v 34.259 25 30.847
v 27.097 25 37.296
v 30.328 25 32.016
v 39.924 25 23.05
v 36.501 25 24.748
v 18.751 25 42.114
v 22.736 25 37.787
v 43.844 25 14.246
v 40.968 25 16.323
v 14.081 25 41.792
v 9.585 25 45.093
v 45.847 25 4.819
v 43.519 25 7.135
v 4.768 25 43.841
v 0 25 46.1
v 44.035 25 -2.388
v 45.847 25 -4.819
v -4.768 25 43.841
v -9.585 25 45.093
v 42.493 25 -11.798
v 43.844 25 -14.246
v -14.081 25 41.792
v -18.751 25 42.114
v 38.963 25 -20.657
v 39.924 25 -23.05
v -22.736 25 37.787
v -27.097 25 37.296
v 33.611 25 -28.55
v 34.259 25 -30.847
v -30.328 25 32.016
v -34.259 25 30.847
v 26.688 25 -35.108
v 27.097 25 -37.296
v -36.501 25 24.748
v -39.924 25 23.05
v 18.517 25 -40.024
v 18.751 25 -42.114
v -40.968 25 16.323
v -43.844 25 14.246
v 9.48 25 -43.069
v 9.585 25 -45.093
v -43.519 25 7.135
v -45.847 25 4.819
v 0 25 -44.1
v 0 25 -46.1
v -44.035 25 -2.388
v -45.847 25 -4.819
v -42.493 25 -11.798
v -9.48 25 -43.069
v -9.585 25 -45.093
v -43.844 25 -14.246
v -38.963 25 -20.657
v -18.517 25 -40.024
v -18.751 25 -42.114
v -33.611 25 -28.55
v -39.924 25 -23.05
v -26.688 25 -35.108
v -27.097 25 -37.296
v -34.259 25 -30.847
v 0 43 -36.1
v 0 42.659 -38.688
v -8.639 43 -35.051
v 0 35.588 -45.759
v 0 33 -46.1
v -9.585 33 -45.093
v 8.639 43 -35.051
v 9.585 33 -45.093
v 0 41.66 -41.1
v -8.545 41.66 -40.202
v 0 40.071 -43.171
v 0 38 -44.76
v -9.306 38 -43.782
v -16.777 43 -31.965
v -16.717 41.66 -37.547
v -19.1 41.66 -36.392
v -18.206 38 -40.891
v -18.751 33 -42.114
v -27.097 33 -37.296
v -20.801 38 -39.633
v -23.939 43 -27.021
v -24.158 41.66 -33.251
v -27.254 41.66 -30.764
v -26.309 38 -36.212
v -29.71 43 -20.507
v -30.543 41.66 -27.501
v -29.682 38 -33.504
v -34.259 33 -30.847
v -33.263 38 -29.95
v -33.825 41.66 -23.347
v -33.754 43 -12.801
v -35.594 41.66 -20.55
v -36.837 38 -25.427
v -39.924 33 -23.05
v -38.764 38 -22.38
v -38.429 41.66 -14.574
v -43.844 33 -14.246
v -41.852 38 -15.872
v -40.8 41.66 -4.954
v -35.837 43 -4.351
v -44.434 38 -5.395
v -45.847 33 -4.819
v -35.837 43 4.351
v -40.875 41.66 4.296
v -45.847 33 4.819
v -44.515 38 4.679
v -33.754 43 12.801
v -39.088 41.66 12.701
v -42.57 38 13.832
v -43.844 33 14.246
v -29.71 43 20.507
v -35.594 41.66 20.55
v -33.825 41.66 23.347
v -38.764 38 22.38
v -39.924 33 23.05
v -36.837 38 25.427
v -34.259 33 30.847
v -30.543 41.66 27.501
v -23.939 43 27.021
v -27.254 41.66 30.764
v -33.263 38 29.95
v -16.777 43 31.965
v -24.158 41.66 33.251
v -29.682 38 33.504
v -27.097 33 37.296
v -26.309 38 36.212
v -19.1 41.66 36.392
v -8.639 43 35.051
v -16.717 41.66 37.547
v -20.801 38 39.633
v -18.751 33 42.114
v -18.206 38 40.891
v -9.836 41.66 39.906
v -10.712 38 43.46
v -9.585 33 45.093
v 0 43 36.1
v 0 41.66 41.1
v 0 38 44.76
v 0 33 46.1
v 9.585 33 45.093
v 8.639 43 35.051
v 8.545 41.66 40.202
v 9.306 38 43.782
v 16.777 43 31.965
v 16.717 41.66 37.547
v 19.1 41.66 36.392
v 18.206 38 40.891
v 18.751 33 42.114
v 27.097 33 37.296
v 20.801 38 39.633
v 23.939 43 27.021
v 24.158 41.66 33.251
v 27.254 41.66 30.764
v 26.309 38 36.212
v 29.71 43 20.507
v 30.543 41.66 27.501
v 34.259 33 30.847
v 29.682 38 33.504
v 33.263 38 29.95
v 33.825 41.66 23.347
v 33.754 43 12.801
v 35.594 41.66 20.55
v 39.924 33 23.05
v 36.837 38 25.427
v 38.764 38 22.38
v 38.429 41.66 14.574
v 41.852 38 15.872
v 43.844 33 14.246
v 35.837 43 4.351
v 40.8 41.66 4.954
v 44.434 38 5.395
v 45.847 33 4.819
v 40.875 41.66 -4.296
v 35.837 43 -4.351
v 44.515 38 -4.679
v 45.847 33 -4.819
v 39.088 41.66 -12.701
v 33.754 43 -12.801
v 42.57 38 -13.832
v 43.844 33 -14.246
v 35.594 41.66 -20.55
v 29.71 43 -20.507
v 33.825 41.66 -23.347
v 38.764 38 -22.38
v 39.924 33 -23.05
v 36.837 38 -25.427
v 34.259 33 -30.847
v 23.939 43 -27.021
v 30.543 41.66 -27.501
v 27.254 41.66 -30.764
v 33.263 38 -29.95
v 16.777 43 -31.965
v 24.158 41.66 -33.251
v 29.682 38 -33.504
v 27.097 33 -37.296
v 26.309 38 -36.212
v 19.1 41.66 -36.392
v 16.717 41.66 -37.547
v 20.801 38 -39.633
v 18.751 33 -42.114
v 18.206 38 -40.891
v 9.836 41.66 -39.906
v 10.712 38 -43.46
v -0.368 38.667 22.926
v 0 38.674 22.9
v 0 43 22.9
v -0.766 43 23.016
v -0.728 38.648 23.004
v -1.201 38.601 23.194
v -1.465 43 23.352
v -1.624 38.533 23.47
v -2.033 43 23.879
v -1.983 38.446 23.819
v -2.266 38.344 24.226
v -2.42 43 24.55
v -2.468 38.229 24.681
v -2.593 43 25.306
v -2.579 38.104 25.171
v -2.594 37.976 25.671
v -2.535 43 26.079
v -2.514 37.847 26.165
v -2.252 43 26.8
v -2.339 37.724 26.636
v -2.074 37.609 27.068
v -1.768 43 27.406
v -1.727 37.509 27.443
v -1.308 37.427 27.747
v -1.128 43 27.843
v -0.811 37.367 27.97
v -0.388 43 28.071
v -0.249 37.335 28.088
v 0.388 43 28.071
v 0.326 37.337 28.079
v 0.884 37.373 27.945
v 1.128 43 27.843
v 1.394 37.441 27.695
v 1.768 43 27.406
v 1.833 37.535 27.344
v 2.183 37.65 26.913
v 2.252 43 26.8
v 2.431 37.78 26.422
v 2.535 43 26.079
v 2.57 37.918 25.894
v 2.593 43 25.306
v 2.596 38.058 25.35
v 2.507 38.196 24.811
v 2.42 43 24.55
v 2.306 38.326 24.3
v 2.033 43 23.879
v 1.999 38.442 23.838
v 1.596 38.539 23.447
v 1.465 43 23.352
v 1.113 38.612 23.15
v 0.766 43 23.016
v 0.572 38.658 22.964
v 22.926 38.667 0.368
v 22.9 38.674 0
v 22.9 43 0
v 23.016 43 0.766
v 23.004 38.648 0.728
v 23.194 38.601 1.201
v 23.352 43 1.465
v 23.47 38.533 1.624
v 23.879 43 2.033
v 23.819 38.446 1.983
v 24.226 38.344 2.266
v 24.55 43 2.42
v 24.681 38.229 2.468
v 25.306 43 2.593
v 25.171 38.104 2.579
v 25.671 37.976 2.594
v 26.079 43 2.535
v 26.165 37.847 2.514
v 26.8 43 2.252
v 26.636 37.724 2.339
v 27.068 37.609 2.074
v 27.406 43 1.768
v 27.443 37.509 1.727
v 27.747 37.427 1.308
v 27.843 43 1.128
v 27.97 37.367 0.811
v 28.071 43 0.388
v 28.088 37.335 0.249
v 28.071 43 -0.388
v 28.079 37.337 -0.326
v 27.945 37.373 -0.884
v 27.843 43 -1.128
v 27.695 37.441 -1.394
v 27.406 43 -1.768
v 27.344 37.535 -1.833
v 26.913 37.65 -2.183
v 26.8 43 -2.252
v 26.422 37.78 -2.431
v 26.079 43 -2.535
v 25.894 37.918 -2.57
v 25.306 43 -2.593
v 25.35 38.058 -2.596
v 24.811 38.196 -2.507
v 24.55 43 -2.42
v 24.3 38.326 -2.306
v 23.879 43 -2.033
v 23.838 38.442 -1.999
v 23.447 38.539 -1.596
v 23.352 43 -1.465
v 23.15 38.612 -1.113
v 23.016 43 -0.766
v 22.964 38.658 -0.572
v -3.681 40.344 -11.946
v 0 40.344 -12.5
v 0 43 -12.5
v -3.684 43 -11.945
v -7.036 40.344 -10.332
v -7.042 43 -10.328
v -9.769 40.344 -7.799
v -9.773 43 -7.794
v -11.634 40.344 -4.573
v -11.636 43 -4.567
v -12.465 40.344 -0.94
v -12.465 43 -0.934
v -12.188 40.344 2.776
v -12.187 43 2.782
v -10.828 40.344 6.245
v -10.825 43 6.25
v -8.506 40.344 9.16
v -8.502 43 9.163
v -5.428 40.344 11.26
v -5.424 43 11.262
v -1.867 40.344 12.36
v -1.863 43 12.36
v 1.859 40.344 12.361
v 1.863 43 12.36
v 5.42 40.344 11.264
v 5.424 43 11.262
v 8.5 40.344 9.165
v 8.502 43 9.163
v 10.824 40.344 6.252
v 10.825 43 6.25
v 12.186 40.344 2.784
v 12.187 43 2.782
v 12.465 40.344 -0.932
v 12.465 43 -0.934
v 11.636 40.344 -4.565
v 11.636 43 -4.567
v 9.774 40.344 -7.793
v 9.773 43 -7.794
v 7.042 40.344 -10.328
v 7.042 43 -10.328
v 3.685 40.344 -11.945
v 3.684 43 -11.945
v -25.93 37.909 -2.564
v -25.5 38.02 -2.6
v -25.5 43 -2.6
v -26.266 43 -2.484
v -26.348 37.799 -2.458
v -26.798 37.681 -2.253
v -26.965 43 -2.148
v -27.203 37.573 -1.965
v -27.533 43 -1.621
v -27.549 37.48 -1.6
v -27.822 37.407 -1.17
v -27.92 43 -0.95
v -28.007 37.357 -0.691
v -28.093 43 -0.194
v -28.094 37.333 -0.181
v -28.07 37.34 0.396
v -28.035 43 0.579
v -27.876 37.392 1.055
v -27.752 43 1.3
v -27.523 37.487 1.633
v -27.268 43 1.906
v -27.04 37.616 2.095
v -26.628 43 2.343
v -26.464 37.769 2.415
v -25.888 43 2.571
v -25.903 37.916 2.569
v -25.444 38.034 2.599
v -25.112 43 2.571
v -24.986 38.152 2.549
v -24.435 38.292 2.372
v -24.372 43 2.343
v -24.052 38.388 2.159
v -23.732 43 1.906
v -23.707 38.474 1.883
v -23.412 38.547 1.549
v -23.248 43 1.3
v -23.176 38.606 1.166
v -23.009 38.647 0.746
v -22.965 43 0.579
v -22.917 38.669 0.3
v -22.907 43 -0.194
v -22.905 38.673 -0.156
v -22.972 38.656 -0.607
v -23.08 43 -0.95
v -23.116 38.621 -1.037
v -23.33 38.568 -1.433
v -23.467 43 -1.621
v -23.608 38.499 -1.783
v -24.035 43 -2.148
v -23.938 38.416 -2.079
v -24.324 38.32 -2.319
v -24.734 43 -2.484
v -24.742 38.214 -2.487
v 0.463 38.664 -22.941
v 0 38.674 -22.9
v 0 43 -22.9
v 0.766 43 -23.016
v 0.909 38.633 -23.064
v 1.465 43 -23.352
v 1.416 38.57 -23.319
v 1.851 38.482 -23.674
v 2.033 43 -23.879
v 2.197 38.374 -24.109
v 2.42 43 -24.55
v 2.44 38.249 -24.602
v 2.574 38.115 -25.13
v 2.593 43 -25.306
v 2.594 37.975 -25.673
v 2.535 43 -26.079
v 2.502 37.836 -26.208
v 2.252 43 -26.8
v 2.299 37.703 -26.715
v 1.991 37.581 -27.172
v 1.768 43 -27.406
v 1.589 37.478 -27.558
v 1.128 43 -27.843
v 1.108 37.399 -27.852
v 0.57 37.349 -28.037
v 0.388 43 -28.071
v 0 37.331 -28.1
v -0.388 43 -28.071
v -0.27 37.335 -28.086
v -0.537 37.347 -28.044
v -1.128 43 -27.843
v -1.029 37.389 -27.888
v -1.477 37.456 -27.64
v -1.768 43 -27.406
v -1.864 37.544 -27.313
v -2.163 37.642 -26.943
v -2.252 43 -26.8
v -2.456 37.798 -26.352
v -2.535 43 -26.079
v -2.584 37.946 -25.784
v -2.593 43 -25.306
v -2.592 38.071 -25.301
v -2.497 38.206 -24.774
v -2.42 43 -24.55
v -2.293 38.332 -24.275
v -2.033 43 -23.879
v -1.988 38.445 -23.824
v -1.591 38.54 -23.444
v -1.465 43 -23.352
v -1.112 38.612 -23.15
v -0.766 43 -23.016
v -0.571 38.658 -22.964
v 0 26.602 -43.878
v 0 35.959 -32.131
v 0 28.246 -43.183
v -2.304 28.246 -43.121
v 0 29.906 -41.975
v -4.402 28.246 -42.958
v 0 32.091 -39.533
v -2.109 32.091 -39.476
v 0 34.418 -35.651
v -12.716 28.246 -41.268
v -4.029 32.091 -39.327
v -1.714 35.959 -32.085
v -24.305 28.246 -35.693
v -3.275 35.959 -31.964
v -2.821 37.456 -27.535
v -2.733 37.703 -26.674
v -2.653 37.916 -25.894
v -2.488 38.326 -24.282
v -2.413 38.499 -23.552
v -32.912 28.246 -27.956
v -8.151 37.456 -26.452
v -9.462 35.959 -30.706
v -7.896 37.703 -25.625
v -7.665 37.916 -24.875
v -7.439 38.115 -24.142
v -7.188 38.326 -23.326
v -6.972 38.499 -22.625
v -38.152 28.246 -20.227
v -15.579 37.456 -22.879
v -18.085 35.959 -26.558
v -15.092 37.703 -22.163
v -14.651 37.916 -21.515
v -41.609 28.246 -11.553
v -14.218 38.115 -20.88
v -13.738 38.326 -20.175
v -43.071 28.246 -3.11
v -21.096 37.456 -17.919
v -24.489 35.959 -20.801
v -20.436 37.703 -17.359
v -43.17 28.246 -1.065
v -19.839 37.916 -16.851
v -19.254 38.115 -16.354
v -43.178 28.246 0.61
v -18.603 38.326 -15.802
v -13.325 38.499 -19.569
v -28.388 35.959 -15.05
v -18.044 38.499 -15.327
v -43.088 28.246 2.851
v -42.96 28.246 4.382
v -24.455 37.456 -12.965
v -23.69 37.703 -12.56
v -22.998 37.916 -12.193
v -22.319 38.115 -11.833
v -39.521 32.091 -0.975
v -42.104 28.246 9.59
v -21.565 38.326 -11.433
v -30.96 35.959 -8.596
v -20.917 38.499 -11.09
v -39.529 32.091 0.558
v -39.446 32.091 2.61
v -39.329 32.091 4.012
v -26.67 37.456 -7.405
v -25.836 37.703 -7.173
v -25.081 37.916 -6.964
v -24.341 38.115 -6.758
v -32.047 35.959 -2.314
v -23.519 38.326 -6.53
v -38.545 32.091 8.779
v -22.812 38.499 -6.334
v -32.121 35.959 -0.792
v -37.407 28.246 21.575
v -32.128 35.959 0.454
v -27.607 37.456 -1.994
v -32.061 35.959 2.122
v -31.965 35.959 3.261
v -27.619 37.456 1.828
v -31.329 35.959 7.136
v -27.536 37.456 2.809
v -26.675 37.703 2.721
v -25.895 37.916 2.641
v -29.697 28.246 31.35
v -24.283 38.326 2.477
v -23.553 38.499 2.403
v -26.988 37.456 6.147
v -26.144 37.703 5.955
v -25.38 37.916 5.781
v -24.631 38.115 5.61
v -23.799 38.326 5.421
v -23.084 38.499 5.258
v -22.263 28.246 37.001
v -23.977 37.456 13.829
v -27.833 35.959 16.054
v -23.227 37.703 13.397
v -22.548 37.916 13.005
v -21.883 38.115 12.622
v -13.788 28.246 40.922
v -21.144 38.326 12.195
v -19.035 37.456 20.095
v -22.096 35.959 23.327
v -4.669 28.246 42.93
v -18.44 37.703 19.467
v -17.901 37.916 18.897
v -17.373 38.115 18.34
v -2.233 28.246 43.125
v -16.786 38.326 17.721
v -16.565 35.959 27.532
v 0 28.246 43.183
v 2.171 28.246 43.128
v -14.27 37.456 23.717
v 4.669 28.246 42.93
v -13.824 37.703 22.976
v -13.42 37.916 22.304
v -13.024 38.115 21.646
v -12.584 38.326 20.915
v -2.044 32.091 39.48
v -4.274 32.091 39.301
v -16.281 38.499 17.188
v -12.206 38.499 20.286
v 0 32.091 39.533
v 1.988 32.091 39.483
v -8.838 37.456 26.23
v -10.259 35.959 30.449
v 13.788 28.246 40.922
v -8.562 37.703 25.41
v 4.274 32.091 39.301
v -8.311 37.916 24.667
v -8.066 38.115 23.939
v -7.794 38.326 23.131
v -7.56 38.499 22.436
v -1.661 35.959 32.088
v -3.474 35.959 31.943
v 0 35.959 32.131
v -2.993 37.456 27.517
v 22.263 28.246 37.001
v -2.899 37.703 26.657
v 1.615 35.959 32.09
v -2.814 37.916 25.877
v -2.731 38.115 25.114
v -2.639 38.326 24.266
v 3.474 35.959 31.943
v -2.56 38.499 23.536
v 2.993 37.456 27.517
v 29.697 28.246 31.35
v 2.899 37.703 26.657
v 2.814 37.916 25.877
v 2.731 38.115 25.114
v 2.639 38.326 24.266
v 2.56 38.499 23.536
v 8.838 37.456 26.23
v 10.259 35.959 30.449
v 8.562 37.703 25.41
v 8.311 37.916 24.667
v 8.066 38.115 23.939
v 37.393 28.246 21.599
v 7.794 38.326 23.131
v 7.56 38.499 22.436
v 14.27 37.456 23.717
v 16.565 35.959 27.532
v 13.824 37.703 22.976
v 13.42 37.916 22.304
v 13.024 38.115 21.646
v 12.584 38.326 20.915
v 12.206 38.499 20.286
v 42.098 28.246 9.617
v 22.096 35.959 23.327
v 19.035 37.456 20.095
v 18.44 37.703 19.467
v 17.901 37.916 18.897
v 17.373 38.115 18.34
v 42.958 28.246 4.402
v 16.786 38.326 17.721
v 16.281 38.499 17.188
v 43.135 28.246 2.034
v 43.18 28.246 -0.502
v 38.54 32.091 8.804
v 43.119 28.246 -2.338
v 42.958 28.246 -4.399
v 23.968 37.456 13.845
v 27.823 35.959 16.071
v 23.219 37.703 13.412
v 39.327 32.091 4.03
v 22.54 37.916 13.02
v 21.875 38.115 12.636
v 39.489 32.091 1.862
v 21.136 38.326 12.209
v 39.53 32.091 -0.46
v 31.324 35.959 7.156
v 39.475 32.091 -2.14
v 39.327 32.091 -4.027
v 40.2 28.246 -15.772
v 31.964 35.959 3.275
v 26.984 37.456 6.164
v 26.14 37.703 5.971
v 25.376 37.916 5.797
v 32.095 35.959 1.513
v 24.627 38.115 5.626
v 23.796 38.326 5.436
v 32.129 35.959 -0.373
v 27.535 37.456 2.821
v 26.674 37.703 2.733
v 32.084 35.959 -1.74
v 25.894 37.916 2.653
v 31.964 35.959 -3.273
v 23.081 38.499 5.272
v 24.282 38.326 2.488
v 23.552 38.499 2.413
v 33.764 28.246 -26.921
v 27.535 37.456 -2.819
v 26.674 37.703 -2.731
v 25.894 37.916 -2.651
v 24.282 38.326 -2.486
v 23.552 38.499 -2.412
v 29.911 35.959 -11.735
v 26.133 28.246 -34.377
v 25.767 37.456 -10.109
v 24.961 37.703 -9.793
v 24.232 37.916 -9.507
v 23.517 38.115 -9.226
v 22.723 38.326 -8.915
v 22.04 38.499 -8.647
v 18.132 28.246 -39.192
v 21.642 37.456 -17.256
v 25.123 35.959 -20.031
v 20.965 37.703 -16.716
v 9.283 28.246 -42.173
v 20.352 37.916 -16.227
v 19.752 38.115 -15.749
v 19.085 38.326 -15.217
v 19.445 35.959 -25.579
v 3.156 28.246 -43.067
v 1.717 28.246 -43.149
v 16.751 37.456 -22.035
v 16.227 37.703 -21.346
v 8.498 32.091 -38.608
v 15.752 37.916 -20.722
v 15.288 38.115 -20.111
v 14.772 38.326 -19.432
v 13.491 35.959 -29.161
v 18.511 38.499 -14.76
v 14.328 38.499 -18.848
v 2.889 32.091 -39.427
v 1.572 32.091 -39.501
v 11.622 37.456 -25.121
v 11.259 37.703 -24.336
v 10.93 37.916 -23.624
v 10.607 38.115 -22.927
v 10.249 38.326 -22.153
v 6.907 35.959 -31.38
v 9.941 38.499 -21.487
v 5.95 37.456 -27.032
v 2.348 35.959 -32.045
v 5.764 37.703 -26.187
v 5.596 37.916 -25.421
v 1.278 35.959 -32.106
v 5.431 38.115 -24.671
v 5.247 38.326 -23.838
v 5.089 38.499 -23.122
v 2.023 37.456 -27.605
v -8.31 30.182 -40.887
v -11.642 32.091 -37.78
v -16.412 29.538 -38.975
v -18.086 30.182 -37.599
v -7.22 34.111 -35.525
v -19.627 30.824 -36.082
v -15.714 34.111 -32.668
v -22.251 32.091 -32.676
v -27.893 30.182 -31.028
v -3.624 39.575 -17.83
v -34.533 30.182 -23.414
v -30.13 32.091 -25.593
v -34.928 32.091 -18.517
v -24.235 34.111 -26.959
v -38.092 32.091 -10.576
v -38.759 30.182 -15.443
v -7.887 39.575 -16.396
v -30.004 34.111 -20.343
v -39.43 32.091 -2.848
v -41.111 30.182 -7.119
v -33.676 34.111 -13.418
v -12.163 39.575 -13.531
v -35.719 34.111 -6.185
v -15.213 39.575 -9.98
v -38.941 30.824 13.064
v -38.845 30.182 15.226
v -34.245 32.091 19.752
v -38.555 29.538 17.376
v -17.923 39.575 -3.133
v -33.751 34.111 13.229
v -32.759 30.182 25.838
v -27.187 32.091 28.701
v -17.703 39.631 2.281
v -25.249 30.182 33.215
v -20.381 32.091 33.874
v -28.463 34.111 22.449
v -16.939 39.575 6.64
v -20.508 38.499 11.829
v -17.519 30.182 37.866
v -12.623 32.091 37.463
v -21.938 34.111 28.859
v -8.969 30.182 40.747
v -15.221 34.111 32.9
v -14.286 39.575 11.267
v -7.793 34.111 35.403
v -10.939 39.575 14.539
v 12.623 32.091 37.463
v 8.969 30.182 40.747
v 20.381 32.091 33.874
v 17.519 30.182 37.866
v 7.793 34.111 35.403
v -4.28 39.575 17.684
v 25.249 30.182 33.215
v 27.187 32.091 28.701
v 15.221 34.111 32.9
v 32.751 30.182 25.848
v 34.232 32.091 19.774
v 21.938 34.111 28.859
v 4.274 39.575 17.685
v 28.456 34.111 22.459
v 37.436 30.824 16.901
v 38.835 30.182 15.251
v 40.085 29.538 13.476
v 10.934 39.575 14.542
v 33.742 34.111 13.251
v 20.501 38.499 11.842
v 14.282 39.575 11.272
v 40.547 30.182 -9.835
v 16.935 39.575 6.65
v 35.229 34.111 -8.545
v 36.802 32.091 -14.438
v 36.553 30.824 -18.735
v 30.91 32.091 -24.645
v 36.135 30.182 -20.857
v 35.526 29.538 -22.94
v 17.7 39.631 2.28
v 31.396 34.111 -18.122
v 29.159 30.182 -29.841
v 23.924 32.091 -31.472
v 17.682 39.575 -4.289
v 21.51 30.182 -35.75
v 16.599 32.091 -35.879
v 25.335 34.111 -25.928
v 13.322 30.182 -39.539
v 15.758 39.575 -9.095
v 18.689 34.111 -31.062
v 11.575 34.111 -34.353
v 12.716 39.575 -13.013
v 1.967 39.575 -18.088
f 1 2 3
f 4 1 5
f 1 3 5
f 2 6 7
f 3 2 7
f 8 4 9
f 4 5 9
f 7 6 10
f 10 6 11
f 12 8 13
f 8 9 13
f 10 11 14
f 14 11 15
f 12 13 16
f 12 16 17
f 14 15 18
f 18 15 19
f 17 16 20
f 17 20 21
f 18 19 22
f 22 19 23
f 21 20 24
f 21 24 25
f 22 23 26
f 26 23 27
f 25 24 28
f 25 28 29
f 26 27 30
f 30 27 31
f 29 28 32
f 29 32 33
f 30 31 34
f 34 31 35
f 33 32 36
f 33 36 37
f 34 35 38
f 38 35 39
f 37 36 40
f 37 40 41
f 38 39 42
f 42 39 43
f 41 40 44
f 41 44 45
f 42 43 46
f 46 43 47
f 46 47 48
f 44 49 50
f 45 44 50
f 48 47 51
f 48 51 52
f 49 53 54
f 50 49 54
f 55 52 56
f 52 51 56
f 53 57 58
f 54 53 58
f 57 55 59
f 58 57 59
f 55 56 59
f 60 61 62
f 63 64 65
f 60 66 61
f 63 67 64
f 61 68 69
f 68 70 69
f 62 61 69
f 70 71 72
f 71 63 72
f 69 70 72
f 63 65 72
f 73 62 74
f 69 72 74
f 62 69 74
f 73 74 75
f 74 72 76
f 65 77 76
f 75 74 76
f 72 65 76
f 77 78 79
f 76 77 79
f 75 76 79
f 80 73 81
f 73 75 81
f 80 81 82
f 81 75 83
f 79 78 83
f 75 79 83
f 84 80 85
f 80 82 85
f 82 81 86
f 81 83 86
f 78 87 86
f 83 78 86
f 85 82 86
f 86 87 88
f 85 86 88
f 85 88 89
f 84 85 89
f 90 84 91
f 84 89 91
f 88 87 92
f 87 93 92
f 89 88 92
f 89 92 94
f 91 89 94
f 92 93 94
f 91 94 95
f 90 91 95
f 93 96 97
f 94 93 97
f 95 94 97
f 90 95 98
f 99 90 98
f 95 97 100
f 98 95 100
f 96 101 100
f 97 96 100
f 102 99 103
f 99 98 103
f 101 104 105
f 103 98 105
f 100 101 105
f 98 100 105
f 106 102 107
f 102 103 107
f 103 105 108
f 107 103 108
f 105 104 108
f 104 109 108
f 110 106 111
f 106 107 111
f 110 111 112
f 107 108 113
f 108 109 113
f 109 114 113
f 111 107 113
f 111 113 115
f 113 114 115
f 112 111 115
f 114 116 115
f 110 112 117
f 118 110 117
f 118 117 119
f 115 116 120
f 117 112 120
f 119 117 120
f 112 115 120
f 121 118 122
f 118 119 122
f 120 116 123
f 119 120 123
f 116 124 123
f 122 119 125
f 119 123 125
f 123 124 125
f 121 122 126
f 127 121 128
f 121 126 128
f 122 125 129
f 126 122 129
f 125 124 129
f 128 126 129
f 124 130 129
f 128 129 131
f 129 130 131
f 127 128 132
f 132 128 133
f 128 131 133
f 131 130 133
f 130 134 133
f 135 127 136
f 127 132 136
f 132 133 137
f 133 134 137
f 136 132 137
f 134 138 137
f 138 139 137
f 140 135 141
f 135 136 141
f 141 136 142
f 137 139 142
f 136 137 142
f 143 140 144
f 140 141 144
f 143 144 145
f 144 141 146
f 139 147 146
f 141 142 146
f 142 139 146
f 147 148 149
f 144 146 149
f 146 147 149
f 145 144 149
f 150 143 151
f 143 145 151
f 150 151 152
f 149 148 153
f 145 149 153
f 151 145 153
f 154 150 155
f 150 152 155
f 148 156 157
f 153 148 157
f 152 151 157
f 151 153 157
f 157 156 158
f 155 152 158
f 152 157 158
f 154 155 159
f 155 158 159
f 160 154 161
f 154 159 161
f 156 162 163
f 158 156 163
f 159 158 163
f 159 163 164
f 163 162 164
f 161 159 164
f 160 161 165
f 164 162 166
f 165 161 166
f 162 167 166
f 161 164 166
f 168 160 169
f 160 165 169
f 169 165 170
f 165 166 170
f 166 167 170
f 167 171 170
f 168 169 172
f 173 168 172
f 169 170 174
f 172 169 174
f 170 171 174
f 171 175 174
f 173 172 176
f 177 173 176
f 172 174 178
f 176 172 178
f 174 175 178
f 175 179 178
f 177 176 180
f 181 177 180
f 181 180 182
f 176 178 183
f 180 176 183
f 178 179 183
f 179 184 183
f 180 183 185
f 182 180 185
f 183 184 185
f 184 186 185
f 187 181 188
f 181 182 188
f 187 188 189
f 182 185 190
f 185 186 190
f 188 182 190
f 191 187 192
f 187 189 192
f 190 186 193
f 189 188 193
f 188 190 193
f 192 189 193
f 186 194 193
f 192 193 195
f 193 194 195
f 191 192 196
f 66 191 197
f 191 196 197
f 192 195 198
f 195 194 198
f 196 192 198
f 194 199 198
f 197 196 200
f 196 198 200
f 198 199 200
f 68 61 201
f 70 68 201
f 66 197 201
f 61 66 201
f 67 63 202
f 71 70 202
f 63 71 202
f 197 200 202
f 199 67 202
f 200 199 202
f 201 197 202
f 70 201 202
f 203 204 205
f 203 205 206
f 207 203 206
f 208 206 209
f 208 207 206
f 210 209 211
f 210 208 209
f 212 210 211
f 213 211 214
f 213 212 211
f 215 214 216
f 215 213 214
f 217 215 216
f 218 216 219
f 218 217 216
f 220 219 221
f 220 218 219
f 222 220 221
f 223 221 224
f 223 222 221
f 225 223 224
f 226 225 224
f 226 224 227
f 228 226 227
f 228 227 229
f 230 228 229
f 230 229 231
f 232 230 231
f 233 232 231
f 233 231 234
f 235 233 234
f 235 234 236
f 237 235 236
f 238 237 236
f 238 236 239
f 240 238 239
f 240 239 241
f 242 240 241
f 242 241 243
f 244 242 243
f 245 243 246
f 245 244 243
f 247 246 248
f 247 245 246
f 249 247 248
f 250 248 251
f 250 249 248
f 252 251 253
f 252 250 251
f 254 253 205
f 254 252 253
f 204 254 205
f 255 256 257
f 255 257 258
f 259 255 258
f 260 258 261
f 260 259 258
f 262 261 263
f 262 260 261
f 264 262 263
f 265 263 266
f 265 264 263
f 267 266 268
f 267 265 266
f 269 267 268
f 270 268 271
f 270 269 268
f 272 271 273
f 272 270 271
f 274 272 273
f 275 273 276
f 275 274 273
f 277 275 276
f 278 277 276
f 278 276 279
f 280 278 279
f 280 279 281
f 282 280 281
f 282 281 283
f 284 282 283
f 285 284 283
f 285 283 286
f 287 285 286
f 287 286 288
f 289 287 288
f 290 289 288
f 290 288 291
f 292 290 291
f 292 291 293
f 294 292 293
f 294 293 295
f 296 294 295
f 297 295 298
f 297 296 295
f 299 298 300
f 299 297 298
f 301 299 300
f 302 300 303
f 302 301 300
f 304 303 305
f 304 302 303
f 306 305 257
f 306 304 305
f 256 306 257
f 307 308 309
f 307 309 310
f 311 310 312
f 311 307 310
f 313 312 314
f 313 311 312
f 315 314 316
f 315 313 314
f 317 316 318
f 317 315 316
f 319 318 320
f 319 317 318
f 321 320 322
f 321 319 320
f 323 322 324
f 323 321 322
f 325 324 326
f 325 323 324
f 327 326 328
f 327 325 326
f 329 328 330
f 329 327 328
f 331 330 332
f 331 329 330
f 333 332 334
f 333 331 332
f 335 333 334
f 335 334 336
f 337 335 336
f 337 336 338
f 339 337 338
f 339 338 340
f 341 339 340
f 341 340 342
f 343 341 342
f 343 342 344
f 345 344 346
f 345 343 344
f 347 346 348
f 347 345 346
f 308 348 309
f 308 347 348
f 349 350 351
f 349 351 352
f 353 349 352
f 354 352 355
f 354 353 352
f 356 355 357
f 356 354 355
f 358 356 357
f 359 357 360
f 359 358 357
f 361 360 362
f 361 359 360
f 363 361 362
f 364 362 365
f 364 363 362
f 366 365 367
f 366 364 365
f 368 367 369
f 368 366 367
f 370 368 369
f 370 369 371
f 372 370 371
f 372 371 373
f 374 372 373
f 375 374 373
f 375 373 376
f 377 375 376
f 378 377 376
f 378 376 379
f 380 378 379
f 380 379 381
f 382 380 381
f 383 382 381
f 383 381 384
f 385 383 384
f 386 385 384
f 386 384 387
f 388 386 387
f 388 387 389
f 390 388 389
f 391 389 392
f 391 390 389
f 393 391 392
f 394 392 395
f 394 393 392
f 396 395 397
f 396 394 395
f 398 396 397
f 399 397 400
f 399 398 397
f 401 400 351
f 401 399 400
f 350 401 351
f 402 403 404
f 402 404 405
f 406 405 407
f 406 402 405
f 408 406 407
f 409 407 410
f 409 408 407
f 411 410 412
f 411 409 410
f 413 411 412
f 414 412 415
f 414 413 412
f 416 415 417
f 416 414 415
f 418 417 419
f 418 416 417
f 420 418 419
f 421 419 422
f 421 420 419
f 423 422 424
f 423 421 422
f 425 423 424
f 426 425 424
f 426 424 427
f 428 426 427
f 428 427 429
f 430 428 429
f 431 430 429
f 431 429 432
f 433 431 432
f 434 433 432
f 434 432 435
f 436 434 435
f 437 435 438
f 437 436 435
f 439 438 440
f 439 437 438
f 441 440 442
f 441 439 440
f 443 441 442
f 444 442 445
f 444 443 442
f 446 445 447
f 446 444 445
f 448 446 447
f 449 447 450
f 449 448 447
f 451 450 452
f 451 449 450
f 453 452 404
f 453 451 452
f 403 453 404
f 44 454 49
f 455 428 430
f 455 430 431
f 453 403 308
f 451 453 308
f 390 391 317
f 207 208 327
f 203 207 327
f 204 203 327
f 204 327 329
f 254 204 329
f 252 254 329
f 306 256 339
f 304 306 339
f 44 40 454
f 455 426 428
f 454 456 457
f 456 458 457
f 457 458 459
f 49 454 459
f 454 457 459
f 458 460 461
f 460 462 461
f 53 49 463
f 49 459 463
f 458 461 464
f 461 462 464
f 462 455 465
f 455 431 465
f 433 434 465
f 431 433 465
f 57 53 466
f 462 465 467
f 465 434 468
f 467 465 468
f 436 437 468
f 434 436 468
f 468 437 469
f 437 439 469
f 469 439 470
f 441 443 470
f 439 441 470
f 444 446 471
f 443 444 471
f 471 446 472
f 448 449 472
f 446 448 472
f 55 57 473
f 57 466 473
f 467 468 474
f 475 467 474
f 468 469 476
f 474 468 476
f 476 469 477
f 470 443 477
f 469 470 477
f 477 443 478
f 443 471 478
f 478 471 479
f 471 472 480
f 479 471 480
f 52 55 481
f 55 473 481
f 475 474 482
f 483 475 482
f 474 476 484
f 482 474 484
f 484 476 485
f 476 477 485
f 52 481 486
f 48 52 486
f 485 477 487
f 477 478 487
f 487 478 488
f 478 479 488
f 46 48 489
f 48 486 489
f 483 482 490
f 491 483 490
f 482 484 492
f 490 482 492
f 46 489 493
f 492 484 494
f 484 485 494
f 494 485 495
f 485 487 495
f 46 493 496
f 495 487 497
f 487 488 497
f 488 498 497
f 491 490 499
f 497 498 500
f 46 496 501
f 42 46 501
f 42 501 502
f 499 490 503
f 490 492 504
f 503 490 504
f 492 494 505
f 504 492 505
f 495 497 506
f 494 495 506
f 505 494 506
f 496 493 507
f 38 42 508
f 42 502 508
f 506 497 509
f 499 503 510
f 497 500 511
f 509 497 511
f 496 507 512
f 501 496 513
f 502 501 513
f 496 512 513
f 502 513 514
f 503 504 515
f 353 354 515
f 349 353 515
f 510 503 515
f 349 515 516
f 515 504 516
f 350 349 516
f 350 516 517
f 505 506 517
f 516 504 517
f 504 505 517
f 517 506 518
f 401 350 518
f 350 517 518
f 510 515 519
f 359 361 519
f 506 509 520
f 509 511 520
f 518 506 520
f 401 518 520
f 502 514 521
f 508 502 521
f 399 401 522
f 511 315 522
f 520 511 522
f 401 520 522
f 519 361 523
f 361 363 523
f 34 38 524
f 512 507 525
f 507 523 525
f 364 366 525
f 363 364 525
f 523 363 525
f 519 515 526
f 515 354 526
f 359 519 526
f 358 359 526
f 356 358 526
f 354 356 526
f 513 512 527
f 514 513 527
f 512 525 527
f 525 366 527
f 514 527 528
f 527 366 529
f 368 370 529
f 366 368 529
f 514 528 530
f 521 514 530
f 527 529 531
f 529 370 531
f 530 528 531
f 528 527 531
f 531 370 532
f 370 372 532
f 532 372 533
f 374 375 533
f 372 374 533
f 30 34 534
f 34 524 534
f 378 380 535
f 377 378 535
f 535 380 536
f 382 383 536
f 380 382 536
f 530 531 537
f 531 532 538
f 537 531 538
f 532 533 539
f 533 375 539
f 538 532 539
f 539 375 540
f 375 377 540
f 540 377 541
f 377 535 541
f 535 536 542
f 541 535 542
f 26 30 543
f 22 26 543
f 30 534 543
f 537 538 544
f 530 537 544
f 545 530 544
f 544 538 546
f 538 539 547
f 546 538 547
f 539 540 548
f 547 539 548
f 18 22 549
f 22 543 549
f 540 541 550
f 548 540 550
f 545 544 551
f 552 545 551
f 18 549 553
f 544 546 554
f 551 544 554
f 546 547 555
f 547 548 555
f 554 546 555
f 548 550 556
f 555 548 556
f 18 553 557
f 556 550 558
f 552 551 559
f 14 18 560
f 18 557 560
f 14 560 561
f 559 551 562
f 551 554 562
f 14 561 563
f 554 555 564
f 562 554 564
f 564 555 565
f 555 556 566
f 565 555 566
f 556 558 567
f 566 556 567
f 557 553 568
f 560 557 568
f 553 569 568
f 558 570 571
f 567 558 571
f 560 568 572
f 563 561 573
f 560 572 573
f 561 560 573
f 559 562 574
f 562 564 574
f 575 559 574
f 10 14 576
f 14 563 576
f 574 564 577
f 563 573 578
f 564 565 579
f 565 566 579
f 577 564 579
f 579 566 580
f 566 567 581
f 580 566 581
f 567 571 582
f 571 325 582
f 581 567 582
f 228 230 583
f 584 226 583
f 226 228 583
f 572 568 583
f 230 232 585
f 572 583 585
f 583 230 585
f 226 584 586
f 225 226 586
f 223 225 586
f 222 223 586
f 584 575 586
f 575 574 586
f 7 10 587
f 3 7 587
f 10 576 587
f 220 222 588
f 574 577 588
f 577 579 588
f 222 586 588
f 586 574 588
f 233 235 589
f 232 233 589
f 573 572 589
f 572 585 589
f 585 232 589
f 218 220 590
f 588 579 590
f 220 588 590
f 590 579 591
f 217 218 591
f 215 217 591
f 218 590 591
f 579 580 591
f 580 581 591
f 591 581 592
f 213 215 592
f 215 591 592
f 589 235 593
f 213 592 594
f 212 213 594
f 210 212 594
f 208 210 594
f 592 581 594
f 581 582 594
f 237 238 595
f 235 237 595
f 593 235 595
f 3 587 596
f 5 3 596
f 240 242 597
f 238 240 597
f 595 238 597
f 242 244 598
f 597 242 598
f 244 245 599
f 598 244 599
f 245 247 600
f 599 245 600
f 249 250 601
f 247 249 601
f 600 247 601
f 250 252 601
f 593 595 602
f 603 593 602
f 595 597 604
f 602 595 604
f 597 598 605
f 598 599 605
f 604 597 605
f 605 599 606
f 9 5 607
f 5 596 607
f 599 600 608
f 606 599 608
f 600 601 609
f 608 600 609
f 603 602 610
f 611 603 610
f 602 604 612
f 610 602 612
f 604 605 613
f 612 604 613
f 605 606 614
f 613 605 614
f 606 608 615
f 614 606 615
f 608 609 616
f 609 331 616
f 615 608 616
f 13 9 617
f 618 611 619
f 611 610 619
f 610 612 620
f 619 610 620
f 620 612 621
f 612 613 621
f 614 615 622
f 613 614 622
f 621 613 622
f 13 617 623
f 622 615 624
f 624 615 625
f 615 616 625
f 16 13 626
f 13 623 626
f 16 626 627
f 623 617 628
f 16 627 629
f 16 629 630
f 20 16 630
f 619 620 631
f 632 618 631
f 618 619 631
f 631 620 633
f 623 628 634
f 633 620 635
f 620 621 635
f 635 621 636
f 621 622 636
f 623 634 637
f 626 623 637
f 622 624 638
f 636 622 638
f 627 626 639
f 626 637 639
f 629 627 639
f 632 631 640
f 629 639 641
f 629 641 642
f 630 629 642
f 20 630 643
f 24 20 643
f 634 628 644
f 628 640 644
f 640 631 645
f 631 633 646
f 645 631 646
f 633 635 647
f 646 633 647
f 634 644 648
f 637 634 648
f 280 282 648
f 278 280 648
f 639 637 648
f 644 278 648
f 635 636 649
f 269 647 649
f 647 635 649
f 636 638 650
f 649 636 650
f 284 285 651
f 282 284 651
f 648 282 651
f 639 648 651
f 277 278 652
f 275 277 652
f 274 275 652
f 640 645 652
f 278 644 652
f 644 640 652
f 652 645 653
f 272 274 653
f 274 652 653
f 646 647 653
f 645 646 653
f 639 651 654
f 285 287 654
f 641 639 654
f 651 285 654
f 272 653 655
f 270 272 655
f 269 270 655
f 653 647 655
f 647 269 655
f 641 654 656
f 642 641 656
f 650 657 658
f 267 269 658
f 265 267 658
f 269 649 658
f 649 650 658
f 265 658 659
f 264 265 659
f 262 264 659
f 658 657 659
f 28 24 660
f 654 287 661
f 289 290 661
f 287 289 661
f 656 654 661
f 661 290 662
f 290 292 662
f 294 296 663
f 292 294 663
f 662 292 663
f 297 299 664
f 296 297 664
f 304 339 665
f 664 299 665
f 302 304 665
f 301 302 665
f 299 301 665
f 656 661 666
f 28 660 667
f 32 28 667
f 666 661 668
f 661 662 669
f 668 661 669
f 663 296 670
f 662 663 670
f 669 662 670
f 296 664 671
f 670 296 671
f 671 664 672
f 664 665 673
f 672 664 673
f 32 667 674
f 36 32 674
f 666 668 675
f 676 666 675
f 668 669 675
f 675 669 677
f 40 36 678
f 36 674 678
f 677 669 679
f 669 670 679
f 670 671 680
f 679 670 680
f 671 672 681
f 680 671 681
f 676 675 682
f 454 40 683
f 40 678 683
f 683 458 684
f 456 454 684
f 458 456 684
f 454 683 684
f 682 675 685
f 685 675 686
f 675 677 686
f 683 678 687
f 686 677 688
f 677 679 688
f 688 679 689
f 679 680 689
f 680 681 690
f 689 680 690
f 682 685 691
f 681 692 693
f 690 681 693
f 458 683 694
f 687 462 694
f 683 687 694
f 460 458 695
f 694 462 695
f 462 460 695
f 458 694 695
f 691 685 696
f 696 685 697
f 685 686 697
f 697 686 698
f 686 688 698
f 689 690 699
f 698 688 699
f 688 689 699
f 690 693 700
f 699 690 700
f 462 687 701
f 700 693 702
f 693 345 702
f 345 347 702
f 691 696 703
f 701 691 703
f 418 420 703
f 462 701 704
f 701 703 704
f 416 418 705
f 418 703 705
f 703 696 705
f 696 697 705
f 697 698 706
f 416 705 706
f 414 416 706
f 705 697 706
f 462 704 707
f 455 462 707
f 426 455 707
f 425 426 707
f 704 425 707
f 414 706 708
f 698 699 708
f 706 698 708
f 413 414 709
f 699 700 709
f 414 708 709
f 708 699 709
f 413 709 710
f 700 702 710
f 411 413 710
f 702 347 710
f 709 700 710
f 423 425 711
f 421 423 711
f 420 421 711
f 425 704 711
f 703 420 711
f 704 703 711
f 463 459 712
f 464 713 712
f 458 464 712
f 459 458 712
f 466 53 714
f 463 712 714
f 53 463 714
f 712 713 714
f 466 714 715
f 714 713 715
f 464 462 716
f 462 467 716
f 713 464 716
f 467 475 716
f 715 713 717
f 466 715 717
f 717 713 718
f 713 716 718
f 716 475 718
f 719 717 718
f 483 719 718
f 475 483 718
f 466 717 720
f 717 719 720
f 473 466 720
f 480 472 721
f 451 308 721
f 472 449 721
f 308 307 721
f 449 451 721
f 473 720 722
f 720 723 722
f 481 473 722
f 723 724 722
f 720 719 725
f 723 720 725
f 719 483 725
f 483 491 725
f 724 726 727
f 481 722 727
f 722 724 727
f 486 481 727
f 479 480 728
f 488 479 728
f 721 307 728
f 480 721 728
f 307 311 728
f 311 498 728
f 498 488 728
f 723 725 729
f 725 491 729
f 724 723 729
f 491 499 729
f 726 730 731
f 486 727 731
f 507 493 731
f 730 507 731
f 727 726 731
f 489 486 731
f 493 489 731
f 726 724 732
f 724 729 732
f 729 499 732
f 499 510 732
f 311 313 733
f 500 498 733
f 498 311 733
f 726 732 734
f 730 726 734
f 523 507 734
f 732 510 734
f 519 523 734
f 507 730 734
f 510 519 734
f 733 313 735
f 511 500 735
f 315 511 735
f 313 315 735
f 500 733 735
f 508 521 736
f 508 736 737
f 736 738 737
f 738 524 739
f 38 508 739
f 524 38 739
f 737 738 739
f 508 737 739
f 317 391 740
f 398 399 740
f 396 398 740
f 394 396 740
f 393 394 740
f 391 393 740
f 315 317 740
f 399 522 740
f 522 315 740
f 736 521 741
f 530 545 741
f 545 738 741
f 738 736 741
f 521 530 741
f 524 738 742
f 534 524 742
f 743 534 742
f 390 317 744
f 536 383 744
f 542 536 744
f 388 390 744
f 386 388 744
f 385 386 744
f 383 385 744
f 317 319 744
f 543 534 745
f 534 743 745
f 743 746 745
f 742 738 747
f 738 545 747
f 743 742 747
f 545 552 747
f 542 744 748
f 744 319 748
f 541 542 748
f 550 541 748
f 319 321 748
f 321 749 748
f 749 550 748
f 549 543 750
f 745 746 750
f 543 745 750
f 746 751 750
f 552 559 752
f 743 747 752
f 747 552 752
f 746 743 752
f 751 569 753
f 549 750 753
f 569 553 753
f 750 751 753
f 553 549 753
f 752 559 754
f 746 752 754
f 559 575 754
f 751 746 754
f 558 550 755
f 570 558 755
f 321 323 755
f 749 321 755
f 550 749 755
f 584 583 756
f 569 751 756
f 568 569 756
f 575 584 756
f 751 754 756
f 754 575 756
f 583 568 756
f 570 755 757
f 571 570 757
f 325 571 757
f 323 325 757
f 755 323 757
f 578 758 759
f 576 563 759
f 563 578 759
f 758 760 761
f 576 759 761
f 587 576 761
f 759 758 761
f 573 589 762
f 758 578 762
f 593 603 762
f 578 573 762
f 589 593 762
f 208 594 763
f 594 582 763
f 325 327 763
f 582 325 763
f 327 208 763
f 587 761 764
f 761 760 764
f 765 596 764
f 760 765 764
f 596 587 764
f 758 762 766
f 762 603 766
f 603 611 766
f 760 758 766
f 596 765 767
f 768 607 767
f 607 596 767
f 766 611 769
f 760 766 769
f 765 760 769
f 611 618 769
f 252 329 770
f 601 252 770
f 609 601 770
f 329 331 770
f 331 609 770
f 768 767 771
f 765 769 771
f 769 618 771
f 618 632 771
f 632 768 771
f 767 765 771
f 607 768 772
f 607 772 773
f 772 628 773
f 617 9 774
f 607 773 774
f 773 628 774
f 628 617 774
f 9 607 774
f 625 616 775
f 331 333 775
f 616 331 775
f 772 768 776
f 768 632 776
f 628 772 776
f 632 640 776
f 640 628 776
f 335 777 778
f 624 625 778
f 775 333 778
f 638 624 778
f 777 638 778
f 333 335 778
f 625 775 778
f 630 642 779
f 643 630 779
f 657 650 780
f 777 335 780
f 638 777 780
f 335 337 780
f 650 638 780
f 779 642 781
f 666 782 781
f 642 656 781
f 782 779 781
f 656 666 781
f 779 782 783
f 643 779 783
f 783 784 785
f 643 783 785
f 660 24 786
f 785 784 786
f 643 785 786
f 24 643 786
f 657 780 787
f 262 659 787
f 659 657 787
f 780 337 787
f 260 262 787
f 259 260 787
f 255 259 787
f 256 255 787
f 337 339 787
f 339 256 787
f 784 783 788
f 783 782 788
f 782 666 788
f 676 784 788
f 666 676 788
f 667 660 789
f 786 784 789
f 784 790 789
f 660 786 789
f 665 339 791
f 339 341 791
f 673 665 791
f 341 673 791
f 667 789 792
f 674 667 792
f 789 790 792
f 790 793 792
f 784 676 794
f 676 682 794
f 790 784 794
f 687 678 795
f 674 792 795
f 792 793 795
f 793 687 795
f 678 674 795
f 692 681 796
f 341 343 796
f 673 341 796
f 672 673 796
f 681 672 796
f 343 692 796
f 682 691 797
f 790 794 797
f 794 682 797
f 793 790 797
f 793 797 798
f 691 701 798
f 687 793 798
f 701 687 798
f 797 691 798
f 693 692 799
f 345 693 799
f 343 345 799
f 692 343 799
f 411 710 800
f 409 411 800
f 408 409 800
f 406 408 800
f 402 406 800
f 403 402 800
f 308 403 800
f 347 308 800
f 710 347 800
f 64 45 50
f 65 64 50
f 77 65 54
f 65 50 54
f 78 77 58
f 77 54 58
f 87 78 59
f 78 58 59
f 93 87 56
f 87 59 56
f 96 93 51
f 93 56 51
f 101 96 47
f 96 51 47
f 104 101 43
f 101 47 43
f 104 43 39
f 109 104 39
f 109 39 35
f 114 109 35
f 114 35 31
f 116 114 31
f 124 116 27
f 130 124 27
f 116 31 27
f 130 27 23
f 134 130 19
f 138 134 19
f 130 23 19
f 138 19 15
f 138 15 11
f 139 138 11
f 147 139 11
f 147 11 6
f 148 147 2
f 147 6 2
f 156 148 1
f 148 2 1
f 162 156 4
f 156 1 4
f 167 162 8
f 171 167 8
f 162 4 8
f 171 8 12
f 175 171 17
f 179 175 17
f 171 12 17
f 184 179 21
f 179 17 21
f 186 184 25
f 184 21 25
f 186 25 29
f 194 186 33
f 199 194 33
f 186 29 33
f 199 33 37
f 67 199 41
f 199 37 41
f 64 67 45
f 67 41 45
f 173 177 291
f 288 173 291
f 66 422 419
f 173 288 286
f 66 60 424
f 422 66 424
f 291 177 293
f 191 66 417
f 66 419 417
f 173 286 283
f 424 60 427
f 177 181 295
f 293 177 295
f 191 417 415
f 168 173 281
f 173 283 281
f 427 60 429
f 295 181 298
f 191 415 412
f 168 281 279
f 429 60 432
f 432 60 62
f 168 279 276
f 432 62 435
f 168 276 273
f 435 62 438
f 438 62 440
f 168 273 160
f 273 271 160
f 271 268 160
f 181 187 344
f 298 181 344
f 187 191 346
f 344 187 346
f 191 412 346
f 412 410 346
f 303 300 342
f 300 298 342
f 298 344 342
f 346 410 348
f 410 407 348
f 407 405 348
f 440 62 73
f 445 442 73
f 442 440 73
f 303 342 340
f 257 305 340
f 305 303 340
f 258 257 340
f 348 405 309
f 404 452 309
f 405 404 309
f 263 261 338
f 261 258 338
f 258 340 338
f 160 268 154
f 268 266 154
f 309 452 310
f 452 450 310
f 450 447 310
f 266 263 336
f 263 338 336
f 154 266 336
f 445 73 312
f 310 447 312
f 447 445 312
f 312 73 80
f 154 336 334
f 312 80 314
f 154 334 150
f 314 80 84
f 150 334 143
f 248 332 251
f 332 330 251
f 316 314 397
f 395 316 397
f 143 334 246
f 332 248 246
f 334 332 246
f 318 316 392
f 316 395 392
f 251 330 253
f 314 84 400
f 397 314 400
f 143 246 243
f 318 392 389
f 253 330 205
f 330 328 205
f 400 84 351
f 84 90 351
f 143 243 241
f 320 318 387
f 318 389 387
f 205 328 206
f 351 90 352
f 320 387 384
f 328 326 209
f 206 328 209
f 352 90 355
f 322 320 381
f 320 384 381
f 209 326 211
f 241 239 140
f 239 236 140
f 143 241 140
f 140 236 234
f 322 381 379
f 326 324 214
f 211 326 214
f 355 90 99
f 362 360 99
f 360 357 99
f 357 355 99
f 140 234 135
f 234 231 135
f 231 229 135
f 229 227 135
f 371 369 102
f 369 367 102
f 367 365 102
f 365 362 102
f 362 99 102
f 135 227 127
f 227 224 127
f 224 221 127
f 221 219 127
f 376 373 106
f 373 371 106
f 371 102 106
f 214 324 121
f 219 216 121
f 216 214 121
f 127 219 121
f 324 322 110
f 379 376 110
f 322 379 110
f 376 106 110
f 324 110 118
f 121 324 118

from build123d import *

# Parameters (mm, degrees)
SKETCH2_R          = 2.6
SKETCH2_R_2        = 12.5
CUT_EXTRUDE1_DEPTH = 79.098783601
FILLET1_R          = 10


with BuildPart() as part:
    # Sketch1 → Revolve1 (revolve)
    with BuildSketch(Plane.XY, mode=Mode.PRIVATE) as revolve1_sk:
        with BuildLine():
            Line((0, 41), (0, 43))
            Line((0, 43), (46.1, 43))
            Line((46.1, 43), (46.1, 25))
            Line((46.1, 25), (44.1, 25))
            add(Edge.make_bspline(
                [(44.1, 25), (44.1, 41), (0, 41)],
                knots=[0, 0, 0, 1.570796327, 1.570796327, 1.570796327], degree=2, weights=[1, 0.707106781, 1]))
        make_face()
    revolve(revolve1_sk.sketch.rotate(Axis((0, 41, 0), (0, 1, 0)), 90), axis=Axis((0, 41, 0), (0, 1, 0)))

    # Sketch2 → Cut-Extrude1 (cut, through all)
    with BuildSketch(Plane(origin=(0, 0, 0), x_dir=(1, 0, 0), z_dir=(0, 1, 0))):
        with Locations(Location((25.5, 0, 0), (0, 0, 180))):
            Circle(SKETCH2_R)
        with Locations(Location((0, -25.5, 0), (0, 0, 90))):
            Circle(SKETCH2_R)
        with Locations(Location((-25.5, 0, 0), (0, 0, 90))):
            Circle(SKETCH2_R)
        with Locations(Location((0, 25.5, 0), (0, 0, 270))):
            Circle(SKETCH2_R)
        with Locations(Location((0, 0, 0), (0, 0, 90))):
            Circle(SKETCH2_R_2)
    extrude(amount=CUT_EXTRUDE1_DEPTH, mode=Mode.SUBTRACT)

    # Fillet1
    fillet1_edges = [part.edges().sort_by_distance(p)[0] for p in [
        (0, 43, 46.1),
    ]]
    fillet(fillet1_edges, radius=FILLET1_R)


solid = part.part
